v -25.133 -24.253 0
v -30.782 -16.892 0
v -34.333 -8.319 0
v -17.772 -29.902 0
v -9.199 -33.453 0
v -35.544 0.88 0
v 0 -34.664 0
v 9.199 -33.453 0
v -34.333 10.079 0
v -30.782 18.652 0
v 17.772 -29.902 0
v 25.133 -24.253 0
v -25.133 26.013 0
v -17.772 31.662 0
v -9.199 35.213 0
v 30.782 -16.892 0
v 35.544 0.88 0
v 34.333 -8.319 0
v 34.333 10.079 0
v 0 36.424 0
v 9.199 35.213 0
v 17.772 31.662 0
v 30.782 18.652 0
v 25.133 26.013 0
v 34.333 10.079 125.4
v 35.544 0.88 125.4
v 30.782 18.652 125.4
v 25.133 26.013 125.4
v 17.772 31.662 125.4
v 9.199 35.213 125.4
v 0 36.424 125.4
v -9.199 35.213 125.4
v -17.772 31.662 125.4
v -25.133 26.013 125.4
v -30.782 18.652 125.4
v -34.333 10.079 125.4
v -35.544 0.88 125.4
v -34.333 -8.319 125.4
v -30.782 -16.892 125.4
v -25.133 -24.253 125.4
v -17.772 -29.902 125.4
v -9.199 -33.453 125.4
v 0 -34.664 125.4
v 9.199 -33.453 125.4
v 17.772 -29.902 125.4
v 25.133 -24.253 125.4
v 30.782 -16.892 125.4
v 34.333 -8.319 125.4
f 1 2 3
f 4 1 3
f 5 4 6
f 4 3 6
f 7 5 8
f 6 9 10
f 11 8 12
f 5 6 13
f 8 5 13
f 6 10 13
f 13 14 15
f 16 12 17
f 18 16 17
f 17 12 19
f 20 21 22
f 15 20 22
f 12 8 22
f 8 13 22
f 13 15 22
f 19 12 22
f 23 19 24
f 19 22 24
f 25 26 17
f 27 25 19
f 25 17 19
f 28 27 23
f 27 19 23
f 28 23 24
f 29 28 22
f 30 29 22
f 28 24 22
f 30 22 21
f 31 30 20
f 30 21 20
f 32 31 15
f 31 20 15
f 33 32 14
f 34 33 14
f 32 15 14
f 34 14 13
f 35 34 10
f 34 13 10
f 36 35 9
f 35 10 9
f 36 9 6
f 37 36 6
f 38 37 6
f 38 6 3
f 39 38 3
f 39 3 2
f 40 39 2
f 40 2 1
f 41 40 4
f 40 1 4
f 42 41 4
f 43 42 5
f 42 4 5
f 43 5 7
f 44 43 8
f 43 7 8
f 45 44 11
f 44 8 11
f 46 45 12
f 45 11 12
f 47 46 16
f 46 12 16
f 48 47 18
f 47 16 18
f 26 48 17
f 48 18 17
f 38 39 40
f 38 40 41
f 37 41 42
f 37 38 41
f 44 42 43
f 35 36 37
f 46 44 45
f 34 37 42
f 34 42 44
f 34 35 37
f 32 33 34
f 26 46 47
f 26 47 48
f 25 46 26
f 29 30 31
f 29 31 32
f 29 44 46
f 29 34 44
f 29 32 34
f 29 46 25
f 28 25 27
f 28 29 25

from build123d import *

# Parameters (mm, degrees)
F0_R      = 35.543794
F1_DEPTH  = 100
F2_R      = 16.15749
F3_DEPTH  = 25.4
F1_FACE_R = 35.543794
F4_DEPTH  = 25.4


with BuildPart() as f1:
    # F0 (on Top) → F1 (new body)
    with BuildSketch(Plane.XY):
        with Locations((0, 0.879988)):
            Circle(F0_R)
    extrude(amount=F1_DEPTH)

    # F2 (on face) → F3 (join)
    with BuildSketch(Plane.XY.offset(100)):
        Circle(F2_R)
    extrude(amount=-F3_DEPTH)

    # F1_face (on face) → F4 (join)
    with BuildSketch(Plane(origin=(0, 0.879988, 100), x_dir=(1, 0, 0), z_dir=(0, 0, 1))):
        Circle(F1_FACE_R)
    extrude(amount=F4_DEPTH)


solid = f1.part
